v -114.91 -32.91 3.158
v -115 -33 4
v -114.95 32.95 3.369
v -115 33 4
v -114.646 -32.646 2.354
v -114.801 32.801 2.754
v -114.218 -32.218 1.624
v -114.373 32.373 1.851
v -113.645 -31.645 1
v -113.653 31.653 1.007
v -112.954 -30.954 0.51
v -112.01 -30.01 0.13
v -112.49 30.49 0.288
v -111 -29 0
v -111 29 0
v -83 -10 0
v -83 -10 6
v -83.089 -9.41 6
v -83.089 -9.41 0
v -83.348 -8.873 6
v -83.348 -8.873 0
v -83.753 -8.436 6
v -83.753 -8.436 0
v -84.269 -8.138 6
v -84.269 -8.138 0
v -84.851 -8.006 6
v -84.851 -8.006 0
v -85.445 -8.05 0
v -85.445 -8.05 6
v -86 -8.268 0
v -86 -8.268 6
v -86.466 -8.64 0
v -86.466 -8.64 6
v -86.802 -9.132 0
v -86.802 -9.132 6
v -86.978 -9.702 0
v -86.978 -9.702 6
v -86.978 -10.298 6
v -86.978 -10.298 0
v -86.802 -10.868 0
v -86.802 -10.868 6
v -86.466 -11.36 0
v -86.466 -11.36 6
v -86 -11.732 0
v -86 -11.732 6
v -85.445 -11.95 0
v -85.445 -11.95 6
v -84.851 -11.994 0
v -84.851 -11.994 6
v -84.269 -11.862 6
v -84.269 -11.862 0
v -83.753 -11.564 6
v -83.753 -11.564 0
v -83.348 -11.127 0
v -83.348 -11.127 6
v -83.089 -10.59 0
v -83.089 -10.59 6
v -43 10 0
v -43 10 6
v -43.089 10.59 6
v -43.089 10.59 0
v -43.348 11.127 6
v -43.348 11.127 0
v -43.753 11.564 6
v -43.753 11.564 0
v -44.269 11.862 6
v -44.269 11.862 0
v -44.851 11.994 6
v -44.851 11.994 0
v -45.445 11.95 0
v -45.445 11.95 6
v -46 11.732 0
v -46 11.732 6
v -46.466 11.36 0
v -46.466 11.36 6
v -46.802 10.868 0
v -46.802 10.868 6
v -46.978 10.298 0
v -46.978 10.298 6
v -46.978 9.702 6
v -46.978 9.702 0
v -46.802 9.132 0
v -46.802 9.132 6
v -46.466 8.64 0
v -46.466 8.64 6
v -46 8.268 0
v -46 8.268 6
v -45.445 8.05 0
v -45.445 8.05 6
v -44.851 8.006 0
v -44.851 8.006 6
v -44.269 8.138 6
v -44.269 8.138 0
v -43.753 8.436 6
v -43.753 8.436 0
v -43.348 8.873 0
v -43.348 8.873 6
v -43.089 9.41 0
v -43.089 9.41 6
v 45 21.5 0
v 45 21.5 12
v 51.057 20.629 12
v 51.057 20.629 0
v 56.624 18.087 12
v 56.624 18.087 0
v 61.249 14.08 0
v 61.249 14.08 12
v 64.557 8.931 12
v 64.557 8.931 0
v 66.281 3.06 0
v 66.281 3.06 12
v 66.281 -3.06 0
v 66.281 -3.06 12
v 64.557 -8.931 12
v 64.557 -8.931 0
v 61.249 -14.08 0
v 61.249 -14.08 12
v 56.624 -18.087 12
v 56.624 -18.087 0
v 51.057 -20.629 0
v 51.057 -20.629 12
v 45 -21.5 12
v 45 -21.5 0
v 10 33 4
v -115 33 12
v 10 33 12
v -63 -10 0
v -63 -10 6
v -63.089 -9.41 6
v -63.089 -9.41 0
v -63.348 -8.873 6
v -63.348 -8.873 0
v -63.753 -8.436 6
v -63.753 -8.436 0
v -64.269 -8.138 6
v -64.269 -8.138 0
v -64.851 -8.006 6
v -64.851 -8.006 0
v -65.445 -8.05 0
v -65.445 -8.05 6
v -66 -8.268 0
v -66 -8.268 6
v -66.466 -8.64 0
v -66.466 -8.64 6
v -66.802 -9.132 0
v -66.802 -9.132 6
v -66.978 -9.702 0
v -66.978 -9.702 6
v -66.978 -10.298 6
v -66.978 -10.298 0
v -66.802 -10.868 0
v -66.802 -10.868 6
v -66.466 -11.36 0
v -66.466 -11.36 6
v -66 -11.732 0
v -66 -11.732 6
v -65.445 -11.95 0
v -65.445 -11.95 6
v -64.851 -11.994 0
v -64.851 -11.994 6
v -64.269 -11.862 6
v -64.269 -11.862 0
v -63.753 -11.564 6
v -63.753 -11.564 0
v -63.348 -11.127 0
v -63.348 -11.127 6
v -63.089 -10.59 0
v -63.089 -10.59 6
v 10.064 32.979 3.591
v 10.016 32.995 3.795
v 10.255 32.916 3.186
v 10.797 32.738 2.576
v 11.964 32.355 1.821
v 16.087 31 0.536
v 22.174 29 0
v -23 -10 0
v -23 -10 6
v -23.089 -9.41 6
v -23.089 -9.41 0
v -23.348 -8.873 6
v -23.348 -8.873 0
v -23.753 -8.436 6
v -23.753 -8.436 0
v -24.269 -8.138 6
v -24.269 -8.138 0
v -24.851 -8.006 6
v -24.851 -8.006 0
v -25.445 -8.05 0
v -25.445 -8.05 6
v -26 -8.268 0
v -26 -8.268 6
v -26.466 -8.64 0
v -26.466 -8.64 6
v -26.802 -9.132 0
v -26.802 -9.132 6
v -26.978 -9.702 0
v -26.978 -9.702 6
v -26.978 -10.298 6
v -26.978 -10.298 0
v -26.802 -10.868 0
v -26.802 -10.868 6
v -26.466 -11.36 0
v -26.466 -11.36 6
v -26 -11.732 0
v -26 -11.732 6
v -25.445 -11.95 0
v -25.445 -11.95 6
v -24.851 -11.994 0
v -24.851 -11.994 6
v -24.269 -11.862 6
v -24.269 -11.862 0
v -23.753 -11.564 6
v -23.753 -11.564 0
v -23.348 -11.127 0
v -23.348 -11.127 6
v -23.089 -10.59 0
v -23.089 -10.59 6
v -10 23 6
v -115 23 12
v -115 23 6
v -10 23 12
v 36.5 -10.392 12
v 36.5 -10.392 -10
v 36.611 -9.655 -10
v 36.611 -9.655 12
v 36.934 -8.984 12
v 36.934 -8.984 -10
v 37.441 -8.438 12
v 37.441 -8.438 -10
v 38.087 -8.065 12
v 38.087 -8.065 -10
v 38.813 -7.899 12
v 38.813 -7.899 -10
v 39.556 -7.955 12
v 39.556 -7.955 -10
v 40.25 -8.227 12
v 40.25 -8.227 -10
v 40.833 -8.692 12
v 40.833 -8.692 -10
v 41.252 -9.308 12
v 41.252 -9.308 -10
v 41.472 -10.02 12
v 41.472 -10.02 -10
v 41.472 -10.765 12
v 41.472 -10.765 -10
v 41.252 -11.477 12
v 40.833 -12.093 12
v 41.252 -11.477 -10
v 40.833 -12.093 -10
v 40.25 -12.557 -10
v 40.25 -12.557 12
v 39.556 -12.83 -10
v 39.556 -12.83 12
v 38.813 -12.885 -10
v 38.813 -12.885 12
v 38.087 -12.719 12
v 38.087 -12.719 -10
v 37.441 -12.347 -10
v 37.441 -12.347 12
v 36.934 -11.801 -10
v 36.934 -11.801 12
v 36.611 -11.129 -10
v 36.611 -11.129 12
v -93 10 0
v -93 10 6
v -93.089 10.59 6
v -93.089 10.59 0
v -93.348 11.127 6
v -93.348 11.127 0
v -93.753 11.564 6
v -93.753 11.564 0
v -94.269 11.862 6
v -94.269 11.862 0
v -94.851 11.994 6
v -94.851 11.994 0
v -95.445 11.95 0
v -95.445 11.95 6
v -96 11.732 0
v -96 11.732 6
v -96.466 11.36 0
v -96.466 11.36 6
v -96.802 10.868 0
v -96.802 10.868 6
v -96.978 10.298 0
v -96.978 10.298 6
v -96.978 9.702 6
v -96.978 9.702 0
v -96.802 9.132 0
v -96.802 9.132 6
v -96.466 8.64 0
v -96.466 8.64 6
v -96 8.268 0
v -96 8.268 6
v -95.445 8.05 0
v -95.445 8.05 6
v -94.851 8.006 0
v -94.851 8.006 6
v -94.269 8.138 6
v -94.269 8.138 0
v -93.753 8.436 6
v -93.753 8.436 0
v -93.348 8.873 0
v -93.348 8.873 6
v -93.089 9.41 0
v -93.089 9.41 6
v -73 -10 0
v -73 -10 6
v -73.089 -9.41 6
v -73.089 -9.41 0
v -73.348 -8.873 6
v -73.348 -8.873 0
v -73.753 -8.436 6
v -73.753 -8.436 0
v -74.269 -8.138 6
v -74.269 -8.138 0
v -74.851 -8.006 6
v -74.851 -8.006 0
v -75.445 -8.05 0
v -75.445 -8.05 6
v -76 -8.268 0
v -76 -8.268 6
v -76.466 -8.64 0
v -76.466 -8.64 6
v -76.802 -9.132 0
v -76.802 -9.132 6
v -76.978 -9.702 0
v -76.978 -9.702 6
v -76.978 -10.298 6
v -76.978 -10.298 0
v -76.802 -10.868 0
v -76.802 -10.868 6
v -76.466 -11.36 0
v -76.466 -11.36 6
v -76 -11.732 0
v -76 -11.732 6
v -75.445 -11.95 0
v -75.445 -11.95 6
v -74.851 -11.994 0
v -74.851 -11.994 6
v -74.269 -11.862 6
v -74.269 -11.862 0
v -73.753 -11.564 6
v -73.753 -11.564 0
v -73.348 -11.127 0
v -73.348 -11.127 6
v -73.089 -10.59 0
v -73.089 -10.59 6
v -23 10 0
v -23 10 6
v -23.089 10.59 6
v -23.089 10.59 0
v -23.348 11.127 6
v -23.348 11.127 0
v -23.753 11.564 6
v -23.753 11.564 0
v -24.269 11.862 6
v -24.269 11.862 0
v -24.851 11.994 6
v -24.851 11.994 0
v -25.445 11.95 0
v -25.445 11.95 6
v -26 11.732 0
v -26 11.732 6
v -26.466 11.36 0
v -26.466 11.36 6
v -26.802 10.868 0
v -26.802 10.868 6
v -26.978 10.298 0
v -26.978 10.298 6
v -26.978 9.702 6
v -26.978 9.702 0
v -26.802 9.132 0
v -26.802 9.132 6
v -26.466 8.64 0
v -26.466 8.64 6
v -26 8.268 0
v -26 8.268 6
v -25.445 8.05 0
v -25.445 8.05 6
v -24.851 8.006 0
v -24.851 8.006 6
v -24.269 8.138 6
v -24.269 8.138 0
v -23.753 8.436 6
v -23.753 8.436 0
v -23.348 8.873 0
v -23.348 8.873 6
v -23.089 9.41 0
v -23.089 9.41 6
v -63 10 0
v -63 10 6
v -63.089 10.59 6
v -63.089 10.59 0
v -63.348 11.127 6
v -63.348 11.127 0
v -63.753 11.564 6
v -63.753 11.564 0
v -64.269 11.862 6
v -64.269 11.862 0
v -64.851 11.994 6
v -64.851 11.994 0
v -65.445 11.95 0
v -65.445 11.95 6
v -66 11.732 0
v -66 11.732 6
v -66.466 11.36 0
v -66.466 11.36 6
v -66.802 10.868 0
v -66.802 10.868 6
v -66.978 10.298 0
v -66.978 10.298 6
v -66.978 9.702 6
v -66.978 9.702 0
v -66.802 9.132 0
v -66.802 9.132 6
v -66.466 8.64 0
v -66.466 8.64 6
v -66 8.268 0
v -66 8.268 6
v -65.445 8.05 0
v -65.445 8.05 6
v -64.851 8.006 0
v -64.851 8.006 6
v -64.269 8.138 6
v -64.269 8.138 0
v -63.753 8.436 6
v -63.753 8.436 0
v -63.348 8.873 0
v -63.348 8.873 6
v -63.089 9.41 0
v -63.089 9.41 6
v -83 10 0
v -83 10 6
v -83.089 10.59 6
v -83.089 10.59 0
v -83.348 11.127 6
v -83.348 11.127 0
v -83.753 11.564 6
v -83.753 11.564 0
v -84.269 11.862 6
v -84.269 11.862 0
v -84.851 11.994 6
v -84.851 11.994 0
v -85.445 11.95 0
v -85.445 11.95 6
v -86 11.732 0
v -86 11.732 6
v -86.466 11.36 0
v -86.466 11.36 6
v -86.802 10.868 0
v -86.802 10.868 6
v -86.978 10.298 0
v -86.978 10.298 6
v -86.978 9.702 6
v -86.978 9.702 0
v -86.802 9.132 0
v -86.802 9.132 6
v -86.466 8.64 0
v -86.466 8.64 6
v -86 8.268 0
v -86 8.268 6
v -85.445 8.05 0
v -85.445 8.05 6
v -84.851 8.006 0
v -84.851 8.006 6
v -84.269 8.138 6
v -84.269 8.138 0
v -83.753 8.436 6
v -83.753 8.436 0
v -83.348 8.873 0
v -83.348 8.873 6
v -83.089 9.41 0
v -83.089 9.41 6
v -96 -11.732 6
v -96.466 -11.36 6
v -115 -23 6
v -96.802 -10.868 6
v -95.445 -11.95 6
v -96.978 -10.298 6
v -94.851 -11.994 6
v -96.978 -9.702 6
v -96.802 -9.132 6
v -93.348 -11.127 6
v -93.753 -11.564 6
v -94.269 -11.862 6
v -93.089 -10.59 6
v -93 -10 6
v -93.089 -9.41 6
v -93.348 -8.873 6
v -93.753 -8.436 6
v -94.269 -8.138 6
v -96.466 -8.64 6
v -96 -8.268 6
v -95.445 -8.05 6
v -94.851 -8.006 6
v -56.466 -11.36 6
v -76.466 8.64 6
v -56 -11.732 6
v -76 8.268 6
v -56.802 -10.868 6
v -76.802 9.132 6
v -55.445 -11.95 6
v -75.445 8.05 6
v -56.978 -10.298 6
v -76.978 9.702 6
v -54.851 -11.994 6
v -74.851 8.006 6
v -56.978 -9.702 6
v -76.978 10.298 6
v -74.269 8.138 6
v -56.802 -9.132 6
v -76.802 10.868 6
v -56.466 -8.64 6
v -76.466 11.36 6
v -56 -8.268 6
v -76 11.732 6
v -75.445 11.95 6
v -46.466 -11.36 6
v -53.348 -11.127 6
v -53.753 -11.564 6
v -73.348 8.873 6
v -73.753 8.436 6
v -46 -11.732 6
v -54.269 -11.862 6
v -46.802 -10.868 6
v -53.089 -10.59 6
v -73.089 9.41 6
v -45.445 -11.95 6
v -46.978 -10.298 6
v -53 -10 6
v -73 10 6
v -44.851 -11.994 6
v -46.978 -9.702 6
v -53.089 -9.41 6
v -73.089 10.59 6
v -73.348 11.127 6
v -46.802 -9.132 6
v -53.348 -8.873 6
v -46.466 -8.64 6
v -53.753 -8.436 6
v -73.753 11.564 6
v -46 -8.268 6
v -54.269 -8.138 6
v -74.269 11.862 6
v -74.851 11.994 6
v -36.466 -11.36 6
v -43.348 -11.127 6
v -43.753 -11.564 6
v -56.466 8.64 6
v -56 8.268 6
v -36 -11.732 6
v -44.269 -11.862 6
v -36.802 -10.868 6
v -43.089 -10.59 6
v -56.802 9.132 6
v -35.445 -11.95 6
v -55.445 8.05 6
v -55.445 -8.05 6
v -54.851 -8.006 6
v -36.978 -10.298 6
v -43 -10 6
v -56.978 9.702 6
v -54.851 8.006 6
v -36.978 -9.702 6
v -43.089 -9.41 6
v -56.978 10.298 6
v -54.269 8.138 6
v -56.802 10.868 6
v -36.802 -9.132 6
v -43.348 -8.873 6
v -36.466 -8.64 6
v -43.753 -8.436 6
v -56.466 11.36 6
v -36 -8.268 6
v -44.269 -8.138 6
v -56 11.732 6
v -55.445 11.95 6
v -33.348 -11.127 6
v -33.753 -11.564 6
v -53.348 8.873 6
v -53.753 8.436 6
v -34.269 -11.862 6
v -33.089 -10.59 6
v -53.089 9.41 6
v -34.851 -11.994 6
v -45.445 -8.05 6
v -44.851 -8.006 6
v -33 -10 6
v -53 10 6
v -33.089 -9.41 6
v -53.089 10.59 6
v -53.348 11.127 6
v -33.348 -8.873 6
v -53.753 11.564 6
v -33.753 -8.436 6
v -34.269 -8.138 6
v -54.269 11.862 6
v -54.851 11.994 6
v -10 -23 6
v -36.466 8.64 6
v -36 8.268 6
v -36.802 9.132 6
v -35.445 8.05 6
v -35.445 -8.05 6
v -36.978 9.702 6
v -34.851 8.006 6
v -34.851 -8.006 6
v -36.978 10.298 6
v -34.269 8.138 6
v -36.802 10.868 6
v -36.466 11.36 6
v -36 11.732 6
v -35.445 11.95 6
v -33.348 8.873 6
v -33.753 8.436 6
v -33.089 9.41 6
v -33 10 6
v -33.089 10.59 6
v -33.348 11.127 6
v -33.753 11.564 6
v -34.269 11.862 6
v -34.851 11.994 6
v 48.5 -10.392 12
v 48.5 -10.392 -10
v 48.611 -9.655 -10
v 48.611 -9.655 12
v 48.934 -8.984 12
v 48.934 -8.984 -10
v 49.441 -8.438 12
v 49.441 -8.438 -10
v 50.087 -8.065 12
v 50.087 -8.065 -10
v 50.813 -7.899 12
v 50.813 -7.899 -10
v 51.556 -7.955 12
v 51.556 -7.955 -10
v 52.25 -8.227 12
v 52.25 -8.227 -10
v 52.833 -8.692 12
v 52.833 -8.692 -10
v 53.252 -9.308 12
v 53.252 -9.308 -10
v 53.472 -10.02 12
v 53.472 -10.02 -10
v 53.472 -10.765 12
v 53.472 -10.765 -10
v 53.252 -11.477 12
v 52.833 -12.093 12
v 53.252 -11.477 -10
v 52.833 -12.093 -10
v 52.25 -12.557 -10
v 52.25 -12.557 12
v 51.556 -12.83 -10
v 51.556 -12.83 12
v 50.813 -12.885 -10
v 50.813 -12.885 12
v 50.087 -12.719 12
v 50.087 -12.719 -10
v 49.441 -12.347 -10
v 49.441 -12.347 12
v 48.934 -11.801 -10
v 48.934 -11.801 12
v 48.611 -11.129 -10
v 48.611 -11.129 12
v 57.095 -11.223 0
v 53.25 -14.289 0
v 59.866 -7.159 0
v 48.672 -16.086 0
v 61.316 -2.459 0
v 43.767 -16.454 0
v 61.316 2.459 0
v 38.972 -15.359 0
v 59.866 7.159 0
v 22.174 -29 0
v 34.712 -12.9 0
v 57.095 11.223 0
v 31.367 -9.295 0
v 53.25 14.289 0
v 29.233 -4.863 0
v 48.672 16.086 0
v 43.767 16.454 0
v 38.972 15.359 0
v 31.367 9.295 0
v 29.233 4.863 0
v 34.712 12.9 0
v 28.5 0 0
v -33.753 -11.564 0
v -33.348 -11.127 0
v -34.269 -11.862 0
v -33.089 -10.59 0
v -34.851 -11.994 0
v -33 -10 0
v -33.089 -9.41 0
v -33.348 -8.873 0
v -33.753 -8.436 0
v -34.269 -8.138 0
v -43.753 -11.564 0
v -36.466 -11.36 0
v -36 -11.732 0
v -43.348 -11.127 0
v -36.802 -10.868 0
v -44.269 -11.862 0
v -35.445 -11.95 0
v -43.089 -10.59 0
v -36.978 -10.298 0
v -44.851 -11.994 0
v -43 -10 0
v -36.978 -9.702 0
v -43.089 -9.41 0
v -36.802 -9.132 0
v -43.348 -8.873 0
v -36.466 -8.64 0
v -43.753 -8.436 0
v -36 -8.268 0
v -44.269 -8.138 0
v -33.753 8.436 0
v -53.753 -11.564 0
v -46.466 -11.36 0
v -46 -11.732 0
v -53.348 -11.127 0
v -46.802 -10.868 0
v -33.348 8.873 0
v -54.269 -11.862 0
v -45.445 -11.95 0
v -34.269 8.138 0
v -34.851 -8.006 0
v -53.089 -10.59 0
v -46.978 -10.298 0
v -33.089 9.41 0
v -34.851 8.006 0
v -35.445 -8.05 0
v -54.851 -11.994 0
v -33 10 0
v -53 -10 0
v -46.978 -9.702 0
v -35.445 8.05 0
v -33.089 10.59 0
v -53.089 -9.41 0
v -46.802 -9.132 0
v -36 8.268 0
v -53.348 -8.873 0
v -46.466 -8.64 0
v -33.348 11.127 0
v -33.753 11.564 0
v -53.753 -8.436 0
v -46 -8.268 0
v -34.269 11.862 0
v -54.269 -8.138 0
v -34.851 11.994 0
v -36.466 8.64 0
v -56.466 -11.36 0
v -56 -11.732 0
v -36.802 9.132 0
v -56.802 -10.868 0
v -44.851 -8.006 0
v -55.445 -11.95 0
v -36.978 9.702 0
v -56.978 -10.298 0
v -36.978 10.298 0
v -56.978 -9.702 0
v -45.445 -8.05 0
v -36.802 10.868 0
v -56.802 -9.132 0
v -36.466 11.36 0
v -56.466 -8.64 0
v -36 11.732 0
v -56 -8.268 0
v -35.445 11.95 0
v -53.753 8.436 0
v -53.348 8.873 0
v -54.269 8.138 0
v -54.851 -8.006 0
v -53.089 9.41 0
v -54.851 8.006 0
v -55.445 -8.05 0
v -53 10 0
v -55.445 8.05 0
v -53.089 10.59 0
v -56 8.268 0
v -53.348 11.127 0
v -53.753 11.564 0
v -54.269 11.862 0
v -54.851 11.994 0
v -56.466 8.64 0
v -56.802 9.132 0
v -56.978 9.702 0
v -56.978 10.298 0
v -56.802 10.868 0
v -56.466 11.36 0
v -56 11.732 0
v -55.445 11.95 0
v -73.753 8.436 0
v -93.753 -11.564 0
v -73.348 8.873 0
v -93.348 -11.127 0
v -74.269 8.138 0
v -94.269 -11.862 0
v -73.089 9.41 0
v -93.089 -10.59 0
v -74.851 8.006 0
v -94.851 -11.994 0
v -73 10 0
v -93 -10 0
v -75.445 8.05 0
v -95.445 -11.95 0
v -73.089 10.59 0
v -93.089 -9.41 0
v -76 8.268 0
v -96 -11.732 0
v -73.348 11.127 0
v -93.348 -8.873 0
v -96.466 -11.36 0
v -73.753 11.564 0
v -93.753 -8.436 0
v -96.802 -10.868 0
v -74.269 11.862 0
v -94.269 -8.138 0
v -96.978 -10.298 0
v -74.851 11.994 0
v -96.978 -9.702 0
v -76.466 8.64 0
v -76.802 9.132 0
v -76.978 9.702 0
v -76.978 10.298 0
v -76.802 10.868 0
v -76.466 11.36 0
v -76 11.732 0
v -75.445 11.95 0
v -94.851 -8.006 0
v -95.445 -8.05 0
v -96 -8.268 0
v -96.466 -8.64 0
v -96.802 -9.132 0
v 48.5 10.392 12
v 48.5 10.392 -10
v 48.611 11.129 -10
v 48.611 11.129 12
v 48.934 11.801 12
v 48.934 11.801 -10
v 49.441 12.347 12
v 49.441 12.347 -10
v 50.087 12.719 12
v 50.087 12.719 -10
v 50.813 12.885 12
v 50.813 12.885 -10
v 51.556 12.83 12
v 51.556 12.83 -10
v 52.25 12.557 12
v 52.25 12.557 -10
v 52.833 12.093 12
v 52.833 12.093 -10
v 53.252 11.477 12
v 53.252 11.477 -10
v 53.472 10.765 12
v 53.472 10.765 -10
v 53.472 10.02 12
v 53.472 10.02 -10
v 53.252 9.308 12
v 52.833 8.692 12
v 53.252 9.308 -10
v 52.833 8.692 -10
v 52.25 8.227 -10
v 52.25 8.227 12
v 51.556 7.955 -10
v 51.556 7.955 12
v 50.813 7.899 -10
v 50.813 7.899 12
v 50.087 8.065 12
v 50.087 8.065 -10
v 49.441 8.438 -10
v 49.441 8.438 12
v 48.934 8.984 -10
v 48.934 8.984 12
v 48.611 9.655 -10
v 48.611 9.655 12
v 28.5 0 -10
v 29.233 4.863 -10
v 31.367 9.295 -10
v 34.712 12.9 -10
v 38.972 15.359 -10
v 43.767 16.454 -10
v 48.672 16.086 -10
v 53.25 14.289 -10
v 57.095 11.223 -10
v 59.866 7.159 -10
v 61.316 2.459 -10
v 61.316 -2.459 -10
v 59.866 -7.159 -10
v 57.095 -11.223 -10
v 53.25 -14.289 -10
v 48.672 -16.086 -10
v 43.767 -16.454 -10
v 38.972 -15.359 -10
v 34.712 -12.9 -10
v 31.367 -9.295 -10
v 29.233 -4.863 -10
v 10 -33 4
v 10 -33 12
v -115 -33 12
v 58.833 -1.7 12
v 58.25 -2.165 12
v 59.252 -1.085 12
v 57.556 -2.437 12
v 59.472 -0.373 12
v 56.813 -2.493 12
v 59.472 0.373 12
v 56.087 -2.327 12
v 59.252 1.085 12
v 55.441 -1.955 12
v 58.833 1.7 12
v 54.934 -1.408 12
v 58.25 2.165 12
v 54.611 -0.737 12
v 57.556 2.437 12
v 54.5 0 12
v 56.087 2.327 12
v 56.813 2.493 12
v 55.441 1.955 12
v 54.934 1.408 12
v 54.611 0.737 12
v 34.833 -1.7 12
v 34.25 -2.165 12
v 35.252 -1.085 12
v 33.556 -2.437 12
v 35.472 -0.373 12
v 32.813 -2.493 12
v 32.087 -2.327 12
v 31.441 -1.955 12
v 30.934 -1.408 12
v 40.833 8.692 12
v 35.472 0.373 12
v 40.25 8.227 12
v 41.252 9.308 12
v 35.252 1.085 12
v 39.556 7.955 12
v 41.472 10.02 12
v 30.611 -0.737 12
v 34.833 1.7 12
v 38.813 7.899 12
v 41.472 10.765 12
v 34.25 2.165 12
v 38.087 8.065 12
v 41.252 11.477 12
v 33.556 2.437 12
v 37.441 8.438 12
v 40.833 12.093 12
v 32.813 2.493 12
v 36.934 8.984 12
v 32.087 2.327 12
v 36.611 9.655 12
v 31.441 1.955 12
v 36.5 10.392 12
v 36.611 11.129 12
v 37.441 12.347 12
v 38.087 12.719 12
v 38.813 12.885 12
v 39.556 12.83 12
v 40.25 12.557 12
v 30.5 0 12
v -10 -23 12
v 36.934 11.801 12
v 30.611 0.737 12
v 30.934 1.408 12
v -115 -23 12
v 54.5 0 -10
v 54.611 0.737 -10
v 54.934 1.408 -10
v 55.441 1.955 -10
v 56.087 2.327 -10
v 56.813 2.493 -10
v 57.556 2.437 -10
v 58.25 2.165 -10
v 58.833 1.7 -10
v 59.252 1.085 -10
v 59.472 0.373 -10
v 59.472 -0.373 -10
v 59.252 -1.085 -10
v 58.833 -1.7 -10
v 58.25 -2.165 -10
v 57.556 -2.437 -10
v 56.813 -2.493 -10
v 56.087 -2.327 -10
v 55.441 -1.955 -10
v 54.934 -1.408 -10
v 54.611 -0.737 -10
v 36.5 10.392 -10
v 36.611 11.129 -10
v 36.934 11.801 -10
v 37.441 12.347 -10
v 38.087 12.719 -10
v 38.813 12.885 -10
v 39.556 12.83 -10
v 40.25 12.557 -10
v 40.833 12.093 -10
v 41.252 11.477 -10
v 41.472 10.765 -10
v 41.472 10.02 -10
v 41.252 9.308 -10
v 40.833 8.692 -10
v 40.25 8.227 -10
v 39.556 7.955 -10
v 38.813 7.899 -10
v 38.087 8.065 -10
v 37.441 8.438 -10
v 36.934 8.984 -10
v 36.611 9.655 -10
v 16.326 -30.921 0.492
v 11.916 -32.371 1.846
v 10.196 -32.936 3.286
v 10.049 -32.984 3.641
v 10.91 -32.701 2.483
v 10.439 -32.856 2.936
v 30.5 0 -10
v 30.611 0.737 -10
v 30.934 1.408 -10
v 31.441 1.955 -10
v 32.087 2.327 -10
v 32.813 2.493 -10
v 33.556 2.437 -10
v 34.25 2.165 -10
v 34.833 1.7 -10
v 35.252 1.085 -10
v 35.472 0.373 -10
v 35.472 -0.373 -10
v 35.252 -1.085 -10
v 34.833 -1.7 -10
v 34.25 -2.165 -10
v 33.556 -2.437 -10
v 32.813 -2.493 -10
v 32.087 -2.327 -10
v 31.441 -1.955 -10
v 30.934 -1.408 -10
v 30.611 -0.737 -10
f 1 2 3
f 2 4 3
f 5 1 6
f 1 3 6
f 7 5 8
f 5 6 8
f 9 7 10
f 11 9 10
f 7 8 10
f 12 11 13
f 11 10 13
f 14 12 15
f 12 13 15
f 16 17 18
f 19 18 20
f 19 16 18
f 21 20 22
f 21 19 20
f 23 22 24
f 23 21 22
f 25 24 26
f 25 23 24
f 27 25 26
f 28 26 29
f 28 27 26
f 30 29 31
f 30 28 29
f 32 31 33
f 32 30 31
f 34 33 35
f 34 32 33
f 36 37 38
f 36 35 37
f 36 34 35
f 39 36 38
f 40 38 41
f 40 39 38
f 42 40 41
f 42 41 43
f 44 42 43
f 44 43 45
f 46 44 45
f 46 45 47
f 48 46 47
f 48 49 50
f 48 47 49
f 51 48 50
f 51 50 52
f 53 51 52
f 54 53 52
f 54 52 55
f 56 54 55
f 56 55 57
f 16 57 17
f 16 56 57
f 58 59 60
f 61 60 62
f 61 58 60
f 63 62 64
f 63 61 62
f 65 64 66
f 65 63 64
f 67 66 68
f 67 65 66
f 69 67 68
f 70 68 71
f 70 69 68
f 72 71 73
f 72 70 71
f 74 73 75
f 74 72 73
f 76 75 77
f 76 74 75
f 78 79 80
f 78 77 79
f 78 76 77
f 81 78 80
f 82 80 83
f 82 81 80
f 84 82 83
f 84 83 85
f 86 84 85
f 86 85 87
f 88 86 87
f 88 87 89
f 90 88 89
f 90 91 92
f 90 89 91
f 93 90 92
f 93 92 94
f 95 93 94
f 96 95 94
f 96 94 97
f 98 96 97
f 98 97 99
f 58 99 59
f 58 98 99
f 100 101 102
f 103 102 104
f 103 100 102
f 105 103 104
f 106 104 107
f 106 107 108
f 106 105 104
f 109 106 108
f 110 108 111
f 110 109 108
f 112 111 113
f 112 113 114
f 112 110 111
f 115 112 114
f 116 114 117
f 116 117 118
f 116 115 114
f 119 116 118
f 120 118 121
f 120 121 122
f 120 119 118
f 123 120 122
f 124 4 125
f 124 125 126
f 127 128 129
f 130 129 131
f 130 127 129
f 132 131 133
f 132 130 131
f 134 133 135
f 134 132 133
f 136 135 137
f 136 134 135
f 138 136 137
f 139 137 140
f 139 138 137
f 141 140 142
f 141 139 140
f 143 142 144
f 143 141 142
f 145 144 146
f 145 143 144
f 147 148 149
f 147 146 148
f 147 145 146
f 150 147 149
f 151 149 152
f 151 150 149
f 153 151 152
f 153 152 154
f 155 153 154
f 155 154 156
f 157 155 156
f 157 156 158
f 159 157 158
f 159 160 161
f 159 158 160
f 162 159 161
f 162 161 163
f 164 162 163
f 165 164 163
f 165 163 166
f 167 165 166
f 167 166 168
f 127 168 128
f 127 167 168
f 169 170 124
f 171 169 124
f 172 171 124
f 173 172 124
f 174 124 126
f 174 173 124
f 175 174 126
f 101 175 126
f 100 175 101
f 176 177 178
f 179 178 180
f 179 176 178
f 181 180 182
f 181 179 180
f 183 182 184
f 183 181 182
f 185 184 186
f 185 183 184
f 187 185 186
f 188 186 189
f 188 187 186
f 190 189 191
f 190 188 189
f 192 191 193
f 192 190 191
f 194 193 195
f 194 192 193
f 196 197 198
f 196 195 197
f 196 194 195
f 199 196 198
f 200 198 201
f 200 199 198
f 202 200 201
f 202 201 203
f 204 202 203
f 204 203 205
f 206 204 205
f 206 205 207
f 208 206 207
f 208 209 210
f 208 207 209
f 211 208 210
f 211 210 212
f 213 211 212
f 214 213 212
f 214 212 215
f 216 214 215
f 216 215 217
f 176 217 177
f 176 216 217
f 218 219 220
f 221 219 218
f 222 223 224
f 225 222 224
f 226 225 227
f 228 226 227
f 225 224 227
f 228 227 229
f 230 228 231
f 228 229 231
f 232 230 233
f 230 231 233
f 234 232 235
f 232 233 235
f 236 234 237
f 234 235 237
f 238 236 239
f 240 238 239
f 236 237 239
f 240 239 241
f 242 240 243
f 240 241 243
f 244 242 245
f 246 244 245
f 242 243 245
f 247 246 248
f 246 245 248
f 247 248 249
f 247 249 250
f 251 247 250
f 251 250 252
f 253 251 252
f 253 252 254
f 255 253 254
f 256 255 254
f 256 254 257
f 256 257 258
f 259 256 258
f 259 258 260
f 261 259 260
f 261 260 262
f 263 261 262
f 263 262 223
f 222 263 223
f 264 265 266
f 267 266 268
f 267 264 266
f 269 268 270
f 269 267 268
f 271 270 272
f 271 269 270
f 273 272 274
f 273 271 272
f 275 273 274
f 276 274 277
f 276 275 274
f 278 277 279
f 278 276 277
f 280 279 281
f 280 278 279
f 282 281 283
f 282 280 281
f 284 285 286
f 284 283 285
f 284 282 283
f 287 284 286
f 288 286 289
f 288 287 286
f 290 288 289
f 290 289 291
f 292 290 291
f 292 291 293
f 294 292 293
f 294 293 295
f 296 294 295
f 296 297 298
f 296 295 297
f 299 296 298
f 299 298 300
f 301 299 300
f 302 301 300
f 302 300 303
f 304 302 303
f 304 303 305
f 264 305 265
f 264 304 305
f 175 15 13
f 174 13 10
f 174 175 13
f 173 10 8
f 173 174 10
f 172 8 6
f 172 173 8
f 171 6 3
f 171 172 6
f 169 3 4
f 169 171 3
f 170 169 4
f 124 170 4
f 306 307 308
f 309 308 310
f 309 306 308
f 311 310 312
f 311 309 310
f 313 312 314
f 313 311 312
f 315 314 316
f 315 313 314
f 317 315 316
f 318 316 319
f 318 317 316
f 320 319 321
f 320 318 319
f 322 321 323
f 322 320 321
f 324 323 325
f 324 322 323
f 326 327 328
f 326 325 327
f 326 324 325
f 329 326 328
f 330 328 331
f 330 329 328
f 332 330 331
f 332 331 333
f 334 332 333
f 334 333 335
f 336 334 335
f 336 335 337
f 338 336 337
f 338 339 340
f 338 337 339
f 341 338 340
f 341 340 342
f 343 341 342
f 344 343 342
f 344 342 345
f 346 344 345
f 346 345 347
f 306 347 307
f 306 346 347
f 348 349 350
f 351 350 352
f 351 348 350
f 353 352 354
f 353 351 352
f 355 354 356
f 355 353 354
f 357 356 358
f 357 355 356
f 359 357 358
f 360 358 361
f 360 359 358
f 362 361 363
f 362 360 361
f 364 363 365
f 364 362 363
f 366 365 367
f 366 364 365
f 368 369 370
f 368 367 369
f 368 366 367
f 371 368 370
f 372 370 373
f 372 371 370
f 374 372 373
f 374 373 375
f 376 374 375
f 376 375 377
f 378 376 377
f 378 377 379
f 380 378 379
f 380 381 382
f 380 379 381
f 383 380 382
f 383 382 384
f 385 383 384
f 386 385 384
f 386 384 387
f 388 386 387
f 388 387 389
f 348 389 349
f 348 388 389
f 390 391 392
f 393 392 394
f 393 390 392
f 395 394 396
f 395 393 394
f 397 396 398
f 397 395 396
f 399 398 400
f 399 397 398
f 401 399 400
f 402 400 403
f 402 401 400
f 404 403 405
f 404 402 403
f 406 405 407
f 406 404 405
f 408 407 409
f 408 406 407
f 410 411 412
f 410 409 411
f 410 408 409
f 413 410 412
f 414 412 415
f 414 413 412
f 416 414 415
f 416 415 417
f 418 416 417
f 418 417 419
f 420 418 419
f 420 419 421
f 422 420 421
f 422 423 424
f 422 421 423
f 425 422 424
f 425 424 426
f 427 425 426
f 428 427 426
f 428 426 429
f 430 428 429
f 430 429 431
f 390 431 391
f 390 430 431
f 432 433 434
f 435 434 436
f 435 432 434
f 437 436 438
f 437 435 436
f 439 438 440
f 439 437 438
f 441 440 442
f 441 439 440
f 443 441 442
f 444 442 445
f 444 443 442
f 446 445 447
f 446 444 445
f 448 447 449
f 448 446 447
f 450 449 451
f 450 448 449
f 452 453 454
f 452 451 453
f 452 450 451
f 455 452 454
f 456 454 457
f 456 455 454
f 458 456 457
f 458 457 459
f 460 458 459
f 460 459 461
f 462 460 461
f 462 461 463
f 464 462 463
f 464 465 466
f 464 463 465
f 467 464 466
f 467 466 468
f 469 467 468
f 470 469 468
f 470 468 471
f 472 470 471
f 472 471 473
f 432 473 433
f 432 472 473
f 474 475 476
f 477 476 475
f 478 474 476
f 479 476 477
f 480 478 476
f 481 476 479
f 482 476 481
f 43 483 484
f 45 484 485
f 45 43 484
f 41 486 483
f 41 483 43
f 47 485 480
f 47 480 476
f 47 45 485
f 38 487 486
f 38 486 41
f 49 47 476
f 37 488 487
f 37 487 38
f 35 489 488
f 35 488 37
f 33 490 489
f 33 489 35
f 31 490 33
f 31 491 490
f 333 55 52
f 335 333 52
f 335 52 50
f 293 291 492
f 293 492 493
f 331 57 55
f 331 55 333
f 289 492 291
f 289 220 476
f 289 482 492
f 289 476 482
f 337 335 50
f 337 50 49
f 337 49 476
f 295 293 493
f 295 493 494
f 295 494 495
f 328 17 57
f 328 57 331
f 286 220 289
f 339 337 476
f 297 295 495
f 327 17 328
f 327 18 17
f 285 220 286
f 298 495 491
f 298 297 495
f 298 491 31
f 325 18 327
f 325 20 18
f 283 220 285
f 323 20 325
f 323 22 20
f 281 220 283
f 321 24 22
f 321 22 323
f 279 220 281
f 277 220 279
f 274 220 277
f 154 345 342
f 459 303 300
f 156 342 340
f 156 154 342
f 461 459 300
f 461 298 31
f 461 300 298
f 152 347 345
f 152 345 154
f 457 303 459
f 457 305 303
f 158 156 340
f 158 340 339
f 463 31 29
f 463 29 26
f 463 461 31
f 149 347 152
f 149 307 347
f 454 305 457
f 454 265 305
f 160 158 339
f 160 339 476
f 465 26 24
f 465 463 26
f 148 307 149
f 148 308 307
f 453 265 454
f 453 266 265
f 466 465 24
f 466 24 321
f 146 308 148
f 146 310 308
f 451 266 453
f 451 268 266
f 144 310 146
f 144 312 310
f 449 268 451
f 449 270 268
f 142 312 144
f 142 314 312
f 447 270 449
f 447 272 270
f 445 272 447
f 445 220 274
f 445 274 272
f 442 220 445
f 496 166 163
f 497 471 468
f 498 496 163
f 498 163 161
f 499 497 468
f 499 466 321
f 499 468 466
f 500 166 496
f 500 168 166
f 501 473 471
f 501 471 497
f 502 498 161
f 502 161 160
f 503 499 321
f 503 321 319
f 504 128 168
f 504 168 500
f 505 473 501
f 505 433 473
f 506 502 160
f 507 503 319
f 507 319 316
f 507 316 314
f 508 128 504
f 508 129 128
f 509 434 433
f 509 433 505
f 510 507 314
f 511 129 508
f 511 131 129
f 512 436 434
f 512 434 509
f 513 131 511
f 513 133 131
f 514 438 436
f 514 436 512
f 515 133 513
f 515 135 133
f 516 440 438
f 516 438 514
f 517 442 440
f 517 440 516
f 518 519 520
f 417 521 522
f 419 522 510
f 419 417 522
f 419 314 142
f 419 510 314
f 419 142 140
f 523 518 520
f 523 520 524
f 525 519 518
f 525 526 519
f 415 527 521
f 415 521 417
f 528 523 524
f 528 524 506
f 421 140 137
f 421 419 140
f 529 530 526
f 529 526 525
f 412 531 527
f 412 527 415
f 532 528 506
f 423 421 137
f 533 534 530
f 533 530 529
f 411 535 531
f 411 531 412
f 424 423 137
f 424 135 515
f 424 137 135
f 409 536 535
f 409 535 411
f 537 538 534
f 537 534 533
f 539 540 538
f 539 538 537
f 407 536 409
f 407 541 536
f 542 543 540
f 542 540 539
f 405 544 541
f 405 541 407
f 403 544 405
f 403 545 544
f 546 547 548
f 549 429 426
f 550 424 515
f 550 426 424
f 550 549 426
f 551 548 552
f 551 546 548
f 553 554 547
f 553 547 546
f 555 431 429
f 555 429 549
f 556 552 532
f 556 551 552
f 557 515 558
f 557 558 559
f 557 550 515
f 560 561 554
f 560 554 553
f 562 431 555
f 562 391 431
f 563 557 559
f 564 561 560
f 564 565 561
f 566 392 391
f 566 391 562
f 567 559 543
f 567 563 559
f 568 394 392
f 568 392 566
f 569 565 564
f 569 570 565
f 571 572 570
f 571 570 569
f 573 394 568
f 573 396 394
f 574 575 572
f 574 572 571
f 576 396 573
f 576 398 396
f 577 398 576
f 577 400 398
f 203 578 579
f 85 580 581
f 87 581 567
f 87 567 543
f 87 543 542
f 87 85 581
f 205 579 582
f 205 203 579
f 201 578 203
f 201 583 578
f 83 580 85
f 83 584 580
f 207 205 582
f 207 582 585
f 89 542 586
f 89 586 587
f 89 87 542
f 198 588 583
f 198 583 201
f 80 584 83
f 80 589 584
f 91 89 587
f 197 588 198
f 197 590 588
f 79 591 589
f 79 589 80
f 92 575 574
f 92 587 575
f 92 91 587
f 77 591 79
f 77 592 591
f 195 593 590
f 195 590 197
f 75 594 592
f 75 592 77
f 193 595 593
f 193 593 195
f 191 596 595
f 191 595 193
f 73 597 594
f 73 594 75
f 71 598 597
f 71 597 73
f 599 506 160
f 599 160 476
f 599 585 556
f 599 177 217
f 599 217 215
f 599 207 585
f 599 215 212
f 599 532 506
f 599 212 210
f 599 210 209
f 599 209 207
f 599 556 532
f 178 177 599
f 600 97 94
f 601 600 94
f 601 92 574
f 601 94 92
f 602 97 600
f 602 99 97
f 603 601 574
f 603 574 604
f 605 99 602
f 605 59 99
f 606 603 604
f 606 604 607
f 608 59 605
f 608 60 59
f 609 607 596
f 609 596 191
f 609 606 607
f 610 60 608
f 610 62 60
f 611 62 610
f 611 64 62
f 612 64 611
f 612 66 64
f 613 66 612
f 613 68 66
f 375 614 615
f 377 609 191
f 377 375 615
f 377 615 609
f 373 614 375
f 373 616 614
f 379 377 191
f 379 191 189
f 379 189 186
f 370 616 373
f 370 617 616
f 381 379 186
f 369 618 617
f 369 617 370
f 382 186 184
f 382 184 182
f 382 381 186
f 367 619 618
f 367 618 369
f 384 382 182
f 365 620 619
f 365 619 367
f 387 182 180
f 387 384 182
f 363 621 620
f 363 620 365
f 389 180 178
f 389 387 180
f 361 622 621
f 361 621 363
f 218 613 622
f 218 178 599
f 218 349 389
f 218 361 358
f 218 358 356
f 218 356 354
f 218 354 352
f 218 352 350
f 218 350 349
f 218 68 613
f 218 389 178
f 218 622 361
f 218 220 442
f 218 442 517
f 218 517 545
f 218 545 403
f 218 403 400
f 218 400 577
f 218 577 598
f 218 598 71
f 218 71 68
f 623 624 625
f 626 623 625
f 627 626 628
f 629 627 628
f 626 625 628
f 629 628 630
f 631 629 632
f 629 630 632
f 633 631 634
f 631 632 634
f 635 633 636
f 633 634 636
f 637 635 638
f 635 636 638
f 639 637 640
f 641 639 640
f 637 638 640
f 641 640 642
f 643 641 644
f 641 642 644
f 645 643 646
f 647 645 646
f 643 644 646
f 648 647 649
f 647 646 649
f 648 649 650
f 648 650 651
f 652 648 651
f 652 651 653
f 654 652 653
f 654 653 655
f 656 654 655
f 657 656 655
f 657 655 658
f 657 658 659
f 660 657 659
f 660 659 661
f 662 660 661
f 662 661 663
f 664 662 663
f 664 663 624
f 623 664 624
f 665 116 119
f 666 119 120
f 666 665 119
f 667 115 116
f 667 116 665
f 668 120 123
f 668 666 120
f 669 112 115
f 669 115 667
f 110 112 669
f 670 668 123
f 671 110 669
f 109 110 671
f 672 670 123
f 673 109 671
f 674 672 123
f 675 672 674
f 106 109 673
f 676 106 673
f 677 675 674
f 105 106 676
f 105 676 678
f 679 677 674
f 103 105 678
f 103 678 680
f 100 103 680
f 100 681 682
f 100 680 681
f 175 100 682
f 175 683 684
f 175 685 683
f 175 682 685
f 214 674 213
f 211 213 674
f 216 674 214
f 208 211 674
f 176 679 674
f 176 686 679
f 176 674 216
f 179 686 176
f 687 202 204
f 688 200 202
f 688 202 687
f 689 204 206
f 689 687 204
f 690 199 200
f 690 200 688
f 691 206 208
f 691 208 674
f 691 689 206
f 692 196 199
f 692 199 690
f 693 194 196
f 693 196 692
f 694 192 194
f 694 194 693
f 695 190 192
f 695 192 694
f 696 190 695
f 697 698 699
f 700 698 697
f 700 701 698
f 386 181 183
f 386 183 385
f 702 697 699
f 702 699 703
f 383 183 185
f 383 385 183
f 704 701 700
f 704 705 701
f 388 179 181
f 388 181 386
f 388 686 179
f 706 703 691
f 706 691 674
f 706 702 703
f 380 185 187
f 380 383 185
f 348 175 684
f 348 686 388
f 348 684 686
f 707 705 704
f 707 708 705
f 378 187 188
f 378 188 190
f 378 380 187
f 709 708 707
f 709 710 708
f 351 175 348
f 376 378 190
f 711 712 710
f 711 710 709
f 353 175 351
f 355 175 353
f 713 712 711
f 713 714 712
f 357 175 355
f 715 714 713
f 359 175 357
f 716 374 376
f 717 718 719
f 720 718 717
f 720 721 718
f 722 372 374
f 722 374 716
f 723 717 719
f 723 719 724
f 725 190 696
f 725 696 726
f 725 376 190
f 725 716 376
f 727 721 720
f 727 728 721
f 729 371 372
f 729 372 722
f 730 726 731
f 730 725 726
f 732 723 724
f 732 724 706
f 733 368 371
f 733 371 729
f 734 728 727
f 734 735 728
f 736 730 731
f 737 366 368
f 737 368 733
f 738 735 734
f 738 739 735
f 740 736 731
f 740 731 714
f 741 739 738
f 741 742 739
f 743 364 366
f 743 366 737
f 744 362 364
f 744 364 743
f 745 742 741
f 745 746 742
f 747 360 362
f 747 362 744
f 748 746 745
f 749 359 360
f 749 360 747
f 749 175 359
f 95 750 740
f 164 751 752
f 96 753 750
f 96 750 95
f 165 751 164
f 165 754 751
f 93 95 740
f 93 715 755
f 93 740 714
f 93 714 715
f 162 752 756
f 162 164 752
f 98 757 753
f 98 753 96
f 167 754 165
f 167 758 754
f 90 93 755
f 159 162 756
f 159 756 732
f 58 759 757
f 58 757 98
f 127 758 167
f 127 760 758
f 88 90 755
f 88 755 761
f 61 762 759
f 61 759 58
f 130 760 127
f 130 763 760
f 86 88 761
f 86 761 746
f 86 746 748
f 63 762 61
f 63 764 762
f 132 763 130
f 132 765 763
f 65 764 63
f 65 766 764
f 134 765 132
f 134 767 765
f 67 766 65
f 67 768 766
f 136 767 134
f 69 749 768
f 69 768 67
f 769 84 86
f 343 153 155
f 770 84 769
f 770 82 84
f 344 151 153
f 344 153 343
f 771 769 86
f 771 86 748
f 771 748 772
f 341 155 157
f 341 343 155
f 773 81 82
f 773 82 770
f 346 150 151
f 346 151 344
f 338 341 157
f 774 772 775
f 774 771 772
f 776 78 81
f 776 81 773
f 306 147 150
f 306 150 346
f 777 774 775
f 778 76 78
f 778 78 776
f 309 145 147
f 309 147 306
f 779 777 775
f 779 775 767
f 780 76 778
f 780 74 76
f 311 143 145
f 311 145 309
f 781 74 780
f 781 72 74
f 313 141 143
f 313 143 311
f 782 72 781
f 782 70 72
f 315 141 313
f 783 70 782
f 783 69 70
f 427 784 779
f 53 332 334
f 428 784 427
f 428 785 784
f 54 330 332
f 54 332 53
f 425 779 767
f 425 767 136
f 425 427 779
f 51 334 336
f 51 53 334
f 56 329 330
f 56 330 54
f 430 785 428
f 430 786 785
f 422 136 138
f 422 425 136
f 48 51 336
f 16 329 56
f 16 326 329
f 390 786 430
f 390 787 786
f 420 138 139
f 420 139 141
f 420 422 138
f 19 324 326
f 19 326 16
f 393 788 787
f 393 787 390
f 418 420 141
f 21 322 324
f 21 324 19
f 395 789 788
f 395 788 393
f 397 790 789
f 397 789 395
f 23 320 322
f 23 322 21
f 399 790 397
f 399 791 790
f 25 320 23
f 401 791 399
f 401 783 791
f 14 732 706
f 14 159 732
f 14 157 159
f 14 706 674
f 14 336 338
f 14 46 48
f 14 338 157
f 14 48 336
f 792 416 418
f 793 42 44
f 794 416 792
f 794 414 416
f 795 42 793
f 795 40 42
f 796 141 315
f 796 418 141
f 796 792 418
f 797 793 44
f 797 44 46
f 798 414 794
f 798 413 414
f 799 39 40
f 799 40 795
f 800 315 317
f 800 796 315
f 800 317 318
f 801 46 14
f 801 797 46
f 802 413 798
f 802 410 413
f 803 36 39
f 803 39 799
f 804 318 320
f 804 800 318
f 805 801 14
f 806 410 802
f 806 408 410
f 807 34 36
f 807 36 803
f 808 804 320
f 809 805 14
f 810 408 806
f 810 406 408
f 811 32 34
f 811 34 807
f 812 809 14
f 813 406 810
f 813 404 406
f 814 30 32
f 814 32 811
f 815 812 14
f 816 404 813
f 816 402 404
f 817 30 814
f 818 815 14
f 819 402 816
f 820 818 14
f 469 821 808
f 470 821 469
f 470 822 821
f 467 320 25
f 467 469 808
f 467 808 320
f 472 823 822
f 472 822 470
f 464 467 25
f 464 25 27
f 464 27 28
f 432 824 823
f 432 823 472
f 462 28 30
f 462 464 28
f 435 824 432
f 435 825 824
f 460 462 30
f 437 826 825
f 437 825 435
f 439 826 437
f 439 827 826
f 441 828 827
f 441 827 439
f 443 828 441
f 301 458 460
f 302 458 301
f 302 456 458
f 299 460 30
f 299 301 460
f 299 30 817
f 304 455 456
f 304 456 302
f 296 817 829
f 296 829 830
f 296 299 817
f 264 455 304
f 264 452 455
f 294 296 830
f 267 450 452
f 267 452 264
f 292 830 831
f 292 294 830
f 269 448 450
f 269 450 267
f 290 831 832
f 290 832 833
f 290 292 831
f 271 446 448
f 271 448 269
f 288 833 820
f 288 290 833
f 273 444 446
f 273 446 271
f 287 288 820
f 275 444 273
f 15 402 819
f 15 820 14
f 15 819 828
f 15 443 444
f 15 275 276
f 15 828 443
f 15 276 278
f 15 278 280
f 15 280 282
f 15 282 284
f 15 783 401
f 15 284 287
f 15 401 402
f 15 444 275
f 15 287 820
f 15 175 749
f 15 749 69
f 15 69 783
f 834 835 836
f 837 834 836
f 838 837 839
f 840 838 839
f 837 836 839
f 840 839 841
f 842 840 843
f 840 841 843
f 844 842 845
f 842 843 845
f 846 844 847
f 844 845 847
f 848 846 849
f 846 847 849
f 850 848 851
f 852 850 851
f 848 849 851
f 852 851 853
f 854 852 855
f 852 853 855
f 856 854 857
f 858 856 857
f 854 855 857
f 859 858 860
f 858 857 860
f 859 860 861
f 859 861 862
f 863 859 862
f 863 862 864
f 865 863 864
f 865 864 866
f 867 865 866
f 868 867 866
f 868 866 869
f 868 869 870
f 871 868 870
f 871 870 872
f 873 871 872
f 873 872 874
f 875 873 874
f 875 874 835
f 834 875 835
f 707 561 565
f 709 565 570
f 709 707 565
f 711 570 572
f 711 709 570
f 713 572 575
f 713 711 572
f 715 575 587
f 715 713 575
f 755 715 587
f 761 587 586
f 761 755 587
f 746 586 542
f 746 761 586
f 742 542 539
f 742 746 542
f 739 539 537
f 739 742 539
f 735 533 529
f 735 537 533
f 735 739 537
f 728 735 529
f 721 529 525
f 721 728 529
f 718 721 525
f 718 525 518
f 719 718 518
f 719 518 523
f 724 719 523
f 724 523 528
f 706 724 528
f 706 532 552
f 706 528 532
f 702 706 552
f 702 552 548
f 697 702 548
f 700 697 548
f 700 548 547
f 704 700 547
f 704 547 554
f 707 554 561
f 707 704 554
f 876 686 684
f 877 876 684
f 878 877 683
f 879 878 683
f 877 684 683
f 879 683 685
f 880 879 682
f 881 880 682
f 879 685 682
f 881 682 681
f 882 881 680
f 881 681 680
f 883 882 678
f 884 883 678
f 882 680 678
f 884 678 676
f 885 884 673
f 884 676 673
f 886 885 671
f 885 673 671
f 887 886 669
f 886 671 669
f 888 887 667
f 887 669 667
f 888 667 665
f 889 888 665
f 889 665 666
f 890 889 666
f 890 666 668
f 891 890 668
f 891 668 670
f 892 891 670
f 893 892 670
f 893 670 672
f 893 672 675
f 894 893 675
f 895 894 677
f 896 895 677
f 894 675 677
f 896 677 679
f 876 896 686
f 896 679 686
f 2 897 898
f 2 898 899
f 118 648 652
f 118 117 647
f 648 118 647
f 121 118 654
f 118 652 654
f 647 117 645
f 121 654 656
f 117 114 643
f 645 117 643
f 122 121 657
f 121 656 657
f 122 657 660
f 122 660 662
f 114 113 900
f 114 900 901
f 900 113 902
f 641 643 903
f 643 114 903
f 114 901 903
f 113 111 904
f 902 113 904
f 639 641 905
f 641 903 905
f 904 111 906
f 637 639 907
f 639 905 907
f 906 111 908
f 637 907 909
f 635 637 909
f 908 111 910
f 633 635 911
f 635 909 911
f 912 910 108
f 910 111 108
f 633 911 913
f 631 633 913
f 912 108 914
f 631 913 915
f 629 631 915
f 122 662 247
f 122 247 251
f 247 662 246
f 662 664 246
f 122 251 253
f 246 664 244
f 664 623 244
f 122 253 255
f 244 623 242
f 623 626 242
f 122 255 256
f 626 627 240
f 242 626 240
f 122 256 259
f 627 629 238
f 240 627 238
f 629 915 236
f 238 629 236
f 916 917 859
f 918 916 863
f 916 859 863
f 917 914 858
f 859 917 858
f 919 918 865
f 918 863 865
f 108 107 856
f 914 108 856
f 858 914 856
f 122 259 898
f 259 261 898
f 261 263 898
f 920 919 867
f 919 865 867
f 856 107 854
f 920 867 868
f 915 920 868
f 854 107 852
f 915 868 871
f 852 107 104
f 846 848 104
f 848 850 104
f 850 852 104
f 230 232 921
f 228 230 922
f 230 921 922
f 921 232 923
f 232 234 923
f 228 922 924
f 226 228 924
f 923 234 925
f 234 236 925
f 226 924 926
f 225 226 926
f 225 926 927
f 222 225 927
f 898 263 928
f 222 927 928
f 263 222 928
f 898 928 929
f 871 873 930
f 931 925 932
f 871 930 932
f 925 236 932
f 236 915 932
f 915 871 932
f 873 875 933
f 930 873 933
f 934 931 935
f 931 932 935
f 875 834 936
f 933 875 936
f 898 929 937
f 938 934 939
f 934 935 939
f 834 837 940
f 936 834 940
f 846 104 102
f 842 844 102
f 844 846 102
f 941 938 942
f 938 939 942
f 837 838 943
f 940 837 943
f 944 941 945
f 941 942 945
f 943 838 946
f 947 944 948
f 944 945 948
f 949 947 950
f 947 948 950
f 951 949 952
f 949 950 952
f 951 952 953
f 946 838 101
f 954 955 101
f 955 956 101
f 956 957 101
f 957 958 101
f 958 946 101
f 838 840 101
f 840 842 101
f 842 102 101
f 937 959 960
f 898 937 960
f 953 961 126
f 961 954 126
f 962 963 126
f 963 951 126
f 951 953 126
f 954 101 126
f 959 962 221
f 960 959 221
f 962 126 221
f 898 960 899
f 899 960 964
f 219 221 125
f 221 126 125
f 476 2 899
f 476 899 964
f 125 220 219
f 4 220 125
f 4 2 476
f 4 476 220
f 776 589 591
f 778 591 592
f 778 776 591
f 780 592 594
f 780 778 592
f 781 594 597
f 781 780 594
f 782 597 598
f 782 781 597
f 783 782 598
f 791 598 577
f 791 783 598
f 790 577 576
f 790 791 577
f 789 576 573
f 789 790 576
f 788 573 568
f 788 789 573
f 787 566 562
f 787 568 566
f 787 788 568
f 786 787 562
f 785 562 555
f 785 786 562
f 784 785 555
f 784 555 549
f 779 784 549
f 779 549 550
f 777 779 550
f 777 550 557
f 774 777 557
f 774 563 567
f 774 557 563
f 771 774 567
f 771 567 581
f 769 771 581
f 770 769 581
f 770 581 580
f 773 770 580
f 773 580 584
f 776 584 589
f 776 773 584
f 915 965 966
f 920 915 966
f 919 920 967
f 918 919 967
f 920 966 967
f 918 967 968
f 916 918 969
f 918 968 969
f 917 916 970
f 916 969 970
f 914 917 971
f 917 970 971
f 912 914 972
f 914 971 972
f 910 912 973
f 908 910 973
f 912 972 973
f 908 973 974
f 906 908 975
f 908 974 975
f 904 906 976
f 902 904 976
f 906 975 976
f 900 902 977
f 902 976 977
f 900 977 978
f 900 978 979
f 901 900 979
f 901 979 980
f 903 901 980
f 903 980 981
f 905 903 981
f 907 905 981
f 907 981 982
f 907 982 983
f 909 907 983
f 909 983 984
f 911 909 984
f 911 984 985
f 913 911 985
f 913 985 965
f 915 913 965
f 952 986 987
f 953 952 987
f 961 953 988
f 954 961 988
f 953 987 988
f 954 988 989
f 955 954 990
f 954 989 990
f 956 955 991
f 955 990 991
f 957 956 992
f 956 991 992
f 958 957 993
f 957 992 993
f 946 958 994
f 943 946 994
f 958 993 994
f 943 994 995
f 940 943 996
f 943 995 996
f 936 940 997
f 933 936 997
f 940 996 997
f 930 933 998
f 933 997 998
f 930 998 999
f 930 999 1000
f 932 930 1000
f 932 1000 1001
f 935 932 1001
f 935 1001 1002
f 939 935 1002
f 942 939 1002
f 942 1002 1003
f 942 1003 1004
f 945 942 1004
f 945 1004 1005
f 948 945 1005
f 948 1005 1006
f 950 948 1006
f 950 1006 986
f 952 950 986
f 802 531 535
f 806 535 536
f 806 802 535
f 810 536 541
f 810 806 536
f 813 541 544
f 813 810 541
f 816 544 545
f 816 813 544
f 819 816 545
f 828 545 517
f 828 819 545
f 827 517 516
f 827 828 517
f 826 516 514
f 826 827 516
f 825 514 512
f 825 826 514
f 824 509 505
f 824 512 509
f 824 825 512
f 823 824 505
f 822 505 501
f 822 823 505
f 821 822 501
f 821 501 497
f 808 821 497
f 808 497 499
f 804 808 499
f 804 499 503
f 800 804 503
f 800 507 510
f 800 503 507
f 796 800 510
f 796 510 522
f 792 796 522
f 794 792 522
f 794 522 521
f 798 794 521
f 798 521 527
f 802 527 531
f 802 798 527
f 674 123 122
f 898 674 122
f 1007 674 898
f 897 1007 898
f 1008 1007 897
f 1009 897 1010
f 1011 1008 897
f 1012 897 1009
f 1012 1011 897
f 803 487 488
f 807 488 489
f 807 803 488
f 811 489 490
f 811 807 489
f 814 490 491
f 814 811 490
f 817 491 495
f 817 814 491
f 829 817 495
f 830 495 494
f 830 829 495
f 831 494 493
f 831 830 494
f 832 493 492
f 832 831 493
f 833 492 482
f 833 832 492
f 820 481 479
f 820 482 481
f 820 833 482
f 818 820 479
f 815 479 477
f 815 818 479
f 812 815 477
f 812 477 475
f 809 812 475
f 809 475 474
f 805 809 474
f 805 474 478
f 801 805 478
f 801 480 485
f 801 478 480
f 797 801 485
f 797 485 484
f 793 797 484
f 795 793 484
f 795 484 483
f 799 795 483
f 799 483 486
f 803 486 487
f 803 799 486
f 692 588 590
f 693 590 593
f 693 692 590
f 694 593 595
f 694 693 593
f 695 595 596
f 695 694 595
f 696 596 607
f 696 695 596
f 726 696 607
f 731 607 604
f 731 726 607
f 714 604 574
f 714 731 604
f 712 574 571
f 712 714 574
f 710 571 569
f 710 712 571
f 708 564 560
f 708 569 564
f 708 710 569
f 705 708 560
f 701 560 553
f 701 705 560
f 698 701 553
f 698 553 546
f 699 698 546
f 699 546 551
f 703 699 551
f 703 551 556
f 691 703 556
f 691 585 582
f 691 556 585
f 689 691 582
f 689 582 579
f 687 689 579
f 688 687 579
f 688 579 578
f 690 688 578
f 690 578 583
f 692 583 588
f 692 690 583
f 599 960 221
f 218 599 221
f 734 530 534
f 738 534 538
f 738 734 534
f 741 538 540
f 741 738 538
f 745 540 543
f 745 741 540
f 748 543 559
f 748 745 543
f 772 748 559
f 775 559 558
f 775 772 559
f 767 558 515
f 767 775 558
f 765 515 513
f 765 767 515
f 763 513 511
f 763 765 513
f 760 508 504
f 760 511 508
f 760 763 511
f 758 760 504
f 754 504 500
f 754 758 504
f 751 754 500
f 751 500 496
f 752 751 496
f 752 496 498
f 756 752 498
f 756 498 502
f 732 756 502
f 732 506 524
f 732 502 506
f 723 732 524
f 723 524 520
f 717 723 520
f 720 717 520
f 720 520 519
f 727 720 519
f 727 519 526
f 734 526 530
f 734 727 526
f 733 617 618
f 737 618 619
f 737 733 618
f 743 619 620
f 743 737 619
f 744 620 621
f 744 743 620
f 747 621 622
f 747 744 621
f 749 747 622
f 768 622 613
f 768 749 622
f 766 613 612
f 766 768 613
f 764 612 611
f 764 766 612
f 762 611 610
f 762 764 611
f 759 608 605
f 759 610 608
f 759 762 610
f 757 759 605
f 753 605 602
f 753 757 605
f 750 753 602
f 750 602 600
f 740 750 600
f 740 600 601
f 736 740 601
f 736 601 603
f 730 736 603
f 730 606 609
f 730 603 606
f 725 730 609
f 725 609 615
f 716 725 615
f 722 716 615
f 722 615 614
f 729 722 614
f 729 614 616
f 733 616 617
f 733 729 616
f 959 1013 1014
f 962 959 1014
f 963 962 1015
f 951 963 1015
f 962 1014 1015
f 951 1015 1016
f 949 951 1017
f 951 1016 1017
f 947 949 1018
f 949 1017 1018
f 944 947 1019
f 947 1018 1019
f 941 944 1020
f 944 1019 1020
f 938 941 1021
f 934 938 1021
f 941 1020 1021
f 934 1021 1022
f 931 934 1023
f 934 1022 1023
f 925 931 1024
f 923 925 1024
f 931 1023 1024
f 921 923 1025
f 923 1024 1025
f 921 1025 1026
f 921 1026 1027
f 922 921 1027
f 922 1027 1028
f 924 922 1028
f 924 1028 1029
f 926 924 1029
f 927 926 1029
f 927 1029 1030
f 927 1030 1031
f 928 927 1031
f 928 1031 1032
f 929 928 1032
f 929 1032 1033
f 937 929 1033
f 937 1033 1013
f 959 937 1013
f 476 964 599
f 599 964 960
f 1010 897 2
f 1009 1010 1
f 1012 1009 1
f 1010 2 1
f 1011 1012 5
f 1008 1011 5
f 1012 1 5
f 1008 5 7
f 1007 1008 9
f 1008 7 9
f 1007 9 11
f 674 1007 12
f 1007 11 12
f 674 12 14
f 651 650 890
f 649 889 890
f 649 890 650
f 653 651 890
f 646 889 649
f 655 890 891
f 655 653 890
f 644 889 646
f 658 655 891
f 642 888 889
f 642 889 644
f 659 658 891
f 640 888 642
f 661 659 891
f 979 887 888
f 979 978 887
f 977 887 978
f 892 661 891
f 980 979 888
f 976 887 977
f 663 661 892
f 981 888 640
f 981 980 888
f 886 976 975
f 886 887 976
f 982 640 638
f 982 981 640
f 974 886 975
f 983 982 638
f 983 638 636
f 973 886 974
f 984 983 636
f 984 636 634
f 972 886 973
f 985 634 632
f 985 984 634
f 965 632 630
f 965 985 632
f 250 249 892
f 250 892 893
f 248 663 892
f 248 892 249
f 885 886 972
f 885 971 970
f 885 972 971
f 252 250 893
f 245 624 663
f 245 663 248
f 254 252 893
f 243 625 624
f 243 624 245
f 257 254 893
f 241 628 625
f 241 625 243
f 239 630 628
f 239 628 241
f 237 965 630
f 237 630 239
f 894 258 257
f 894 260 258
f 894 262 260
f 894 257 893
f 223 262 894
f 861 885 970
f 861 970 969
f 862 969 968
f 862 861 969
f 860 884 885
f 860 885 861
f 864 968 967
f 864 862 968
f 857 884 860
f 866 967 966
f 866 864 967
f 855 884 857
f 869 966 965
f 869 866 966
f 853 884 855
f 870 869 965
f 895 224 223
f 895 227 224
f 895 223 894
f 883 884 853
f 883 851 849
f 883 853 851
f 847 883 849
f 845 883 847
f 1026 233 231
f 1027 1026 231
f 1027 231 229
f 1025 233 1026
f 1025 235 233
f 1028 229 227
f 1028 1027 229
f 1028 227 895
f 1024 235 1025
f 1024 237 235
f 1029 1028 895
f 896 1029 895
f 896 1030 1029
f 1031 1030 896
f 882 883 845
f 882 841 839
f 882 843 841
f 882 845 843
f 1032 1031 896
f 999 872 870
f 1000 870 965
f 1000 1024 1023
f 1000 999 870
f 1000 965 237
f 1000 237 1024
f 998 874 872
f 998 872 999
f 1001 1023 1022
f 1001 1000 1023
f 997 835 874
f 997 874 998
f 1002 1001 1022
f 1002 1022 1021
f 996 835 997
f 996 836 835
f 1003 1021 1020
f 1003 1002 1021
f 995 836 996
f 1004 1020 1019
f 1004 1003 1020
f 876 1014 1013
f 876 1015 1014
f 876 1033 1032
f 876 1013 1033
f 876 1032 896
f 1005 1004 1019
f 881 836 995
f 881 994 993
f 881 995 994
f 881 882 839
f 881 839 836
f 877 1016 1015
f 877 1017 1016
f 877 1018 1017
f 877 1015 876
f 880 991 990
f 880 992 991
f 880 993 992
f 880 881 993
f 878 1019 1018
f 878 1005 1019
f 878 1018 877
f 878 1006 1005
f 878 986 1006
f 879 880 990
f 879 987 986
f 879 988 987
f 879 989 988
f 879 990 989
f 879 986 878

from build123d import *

# Parameters (mm, degrees)
SKETCH_1_R          = 2
EXTRUDE_1_DEPTH     = 12
SKETCH_6_R          = 16.5
EXTRUDE_3_DEPTH     = 10
SKETCH_7_R          = 2.5
CUT_EXTRUDE_3_DEPTH = 122.647030379
SKETCH_10_W         = 105
SKETCH_10_H         = 46
CUT_EXTRUDE_5_DEPTH = 6
FILLET_1_R          = 4


with BuildPart() as part:
    # 草图1 → 凸台-拉伸1 (new body)
    with BuildSketch(Plane.XY):
        with BuildLine():
            Line((10, -33), (-45, -33))
            Line((-45, -33), (-115, -33))
            Line((-115, -33), (-115, 33))
            Line((-115, 33), (-45, 33))
            Line((-45, 33), (10, 33))
            Line((10, 33), (45, 21.5))
            ThreePointArc((45, 21.5), (66.5, 0), (45, -21.5))
            Line((45, -21.5), (10, -33))
        make_face()
        with Locations((-35, 10)):
            Circle(SKETCH_1_R, mode=Mode.SUBTRACT)
        with Locations((-25, 10)):
            Circle(SKETCH_1_R, mode=Mode.SUBTRACT)
        with Locations((-25, -10)):
            Circle(SKETCH_1_R, mode=Mode.SUBTRACT)
        with Locations((-35, -10)):
            Circle(SKETCH_1_R, mode=Mode.SUBTRACT)
        with Locations((-55, 10)):
            Circle(SKETCH_1_R, mode=Mode.SUBTRACT)
        with Locations((-55, -10)):
            Circle(SKETCH_1_R, mode=Mode.SUBTRACT)
        with Locations((-45, -10)):
            Circle(SKETCH_1_R, mode=Mode.SUBTRACT)
        with Locations((-45, 10)):
            Circle(SKETCH_1_R, mode=Mode.SUBTRACT)
        with Locations((-75, 10)):
            Circle(SKETCH_1_R, mode=Mode.SUBTRACT)
        with Locations((-75, -10)):
            Circle(SKETCH_1_R, mode=Mode.SUBTRACT)
        with Locations((-65, -10)):
            Circle(SKETCH_1_R, mode=Mode.SUBTRACT)
        with Locations((-65, 10)):
            Circle(SKETCH_1_R, mode=Mode.SUBTRACT)
        with Locations((-95, 10)):
            Circle(SKETCH_1_R, mode=Mode.SUBTRACT)
        with Locations((-95, -10)):
            Circle(SKETCH_1_R, mode=Mode.SUBTRACT)
        with Locations((-85, -10)):
            Circle(SKETCH_1_R, mode=Mode.SUBTRACT)
        with Locations((-85, 10)):
            Circle(SKETCH_1_R, mode=Mode.SUBTRACT)
    extrude(amount=EXTRUDE_1_DEPTH)

    # 草图6 → 凸台-拉伸3 (add)
    with BuildSketch(Plane(origin=(0, 0, 0), x_dir=(-1, 0, 0), z_dir=(0, 0, -1))):
        with Locations((-45, 0)):
            Circle(SKETCH_6_R)
    extrude(amount=EXTRUDE_3_DEPTH)

    # 草图7 → 切除-拉伸3 (cut, through all)
    with BuildSketch(Plane(origin=(0, 0, -10), x_dir=(-1, 0, 0), z_dir=(0, 0, -1))):
        with Locations((-51, 10.392304845)):
            Circle(SKETCH_7_R)
        with Locations((-39, 10.392304845)):
            Circle(SKETCH_7_R)
        with Locations((-33, 0)):
            Circle(SKETCH_7_R)
        with Locations((-39, -10.392304845)):
            Circle(SKETCH_7_R)
        with Locations((-51, -10.392304845)):
            Circle(SKETCH_7_R)
        with Locations((-57, 0)):
            Circle(SKETCH_7_R)
    extrude(amount=-CUT_EXTRUDE_3_DEPTH, mode=Mode.SUBTRACT)

    # 草图10 → 切除-拉伸5 (cut)
    with BuildSketch(Plane.XY.offset(12)):
        with Locations((-62.5, 0)):
            Rectangle(SKETCH_10_W, SKETCH_10_H)
    extrude(amount=-CUT_EXTRUDE_5_DEPTH, mode=Mode.SUBTRACT)

    # 圆角1
    fillet_1_edges = [part.edges().sort_by_distance(p)[0] for p in [
        (-52.5, 33, 0),
        (-52.5, -33, 0),
        (-115, 0, 0),
    ]]
    fillet(fillet_1_edges, radius=FILLET_1_R)


solid = part.part
